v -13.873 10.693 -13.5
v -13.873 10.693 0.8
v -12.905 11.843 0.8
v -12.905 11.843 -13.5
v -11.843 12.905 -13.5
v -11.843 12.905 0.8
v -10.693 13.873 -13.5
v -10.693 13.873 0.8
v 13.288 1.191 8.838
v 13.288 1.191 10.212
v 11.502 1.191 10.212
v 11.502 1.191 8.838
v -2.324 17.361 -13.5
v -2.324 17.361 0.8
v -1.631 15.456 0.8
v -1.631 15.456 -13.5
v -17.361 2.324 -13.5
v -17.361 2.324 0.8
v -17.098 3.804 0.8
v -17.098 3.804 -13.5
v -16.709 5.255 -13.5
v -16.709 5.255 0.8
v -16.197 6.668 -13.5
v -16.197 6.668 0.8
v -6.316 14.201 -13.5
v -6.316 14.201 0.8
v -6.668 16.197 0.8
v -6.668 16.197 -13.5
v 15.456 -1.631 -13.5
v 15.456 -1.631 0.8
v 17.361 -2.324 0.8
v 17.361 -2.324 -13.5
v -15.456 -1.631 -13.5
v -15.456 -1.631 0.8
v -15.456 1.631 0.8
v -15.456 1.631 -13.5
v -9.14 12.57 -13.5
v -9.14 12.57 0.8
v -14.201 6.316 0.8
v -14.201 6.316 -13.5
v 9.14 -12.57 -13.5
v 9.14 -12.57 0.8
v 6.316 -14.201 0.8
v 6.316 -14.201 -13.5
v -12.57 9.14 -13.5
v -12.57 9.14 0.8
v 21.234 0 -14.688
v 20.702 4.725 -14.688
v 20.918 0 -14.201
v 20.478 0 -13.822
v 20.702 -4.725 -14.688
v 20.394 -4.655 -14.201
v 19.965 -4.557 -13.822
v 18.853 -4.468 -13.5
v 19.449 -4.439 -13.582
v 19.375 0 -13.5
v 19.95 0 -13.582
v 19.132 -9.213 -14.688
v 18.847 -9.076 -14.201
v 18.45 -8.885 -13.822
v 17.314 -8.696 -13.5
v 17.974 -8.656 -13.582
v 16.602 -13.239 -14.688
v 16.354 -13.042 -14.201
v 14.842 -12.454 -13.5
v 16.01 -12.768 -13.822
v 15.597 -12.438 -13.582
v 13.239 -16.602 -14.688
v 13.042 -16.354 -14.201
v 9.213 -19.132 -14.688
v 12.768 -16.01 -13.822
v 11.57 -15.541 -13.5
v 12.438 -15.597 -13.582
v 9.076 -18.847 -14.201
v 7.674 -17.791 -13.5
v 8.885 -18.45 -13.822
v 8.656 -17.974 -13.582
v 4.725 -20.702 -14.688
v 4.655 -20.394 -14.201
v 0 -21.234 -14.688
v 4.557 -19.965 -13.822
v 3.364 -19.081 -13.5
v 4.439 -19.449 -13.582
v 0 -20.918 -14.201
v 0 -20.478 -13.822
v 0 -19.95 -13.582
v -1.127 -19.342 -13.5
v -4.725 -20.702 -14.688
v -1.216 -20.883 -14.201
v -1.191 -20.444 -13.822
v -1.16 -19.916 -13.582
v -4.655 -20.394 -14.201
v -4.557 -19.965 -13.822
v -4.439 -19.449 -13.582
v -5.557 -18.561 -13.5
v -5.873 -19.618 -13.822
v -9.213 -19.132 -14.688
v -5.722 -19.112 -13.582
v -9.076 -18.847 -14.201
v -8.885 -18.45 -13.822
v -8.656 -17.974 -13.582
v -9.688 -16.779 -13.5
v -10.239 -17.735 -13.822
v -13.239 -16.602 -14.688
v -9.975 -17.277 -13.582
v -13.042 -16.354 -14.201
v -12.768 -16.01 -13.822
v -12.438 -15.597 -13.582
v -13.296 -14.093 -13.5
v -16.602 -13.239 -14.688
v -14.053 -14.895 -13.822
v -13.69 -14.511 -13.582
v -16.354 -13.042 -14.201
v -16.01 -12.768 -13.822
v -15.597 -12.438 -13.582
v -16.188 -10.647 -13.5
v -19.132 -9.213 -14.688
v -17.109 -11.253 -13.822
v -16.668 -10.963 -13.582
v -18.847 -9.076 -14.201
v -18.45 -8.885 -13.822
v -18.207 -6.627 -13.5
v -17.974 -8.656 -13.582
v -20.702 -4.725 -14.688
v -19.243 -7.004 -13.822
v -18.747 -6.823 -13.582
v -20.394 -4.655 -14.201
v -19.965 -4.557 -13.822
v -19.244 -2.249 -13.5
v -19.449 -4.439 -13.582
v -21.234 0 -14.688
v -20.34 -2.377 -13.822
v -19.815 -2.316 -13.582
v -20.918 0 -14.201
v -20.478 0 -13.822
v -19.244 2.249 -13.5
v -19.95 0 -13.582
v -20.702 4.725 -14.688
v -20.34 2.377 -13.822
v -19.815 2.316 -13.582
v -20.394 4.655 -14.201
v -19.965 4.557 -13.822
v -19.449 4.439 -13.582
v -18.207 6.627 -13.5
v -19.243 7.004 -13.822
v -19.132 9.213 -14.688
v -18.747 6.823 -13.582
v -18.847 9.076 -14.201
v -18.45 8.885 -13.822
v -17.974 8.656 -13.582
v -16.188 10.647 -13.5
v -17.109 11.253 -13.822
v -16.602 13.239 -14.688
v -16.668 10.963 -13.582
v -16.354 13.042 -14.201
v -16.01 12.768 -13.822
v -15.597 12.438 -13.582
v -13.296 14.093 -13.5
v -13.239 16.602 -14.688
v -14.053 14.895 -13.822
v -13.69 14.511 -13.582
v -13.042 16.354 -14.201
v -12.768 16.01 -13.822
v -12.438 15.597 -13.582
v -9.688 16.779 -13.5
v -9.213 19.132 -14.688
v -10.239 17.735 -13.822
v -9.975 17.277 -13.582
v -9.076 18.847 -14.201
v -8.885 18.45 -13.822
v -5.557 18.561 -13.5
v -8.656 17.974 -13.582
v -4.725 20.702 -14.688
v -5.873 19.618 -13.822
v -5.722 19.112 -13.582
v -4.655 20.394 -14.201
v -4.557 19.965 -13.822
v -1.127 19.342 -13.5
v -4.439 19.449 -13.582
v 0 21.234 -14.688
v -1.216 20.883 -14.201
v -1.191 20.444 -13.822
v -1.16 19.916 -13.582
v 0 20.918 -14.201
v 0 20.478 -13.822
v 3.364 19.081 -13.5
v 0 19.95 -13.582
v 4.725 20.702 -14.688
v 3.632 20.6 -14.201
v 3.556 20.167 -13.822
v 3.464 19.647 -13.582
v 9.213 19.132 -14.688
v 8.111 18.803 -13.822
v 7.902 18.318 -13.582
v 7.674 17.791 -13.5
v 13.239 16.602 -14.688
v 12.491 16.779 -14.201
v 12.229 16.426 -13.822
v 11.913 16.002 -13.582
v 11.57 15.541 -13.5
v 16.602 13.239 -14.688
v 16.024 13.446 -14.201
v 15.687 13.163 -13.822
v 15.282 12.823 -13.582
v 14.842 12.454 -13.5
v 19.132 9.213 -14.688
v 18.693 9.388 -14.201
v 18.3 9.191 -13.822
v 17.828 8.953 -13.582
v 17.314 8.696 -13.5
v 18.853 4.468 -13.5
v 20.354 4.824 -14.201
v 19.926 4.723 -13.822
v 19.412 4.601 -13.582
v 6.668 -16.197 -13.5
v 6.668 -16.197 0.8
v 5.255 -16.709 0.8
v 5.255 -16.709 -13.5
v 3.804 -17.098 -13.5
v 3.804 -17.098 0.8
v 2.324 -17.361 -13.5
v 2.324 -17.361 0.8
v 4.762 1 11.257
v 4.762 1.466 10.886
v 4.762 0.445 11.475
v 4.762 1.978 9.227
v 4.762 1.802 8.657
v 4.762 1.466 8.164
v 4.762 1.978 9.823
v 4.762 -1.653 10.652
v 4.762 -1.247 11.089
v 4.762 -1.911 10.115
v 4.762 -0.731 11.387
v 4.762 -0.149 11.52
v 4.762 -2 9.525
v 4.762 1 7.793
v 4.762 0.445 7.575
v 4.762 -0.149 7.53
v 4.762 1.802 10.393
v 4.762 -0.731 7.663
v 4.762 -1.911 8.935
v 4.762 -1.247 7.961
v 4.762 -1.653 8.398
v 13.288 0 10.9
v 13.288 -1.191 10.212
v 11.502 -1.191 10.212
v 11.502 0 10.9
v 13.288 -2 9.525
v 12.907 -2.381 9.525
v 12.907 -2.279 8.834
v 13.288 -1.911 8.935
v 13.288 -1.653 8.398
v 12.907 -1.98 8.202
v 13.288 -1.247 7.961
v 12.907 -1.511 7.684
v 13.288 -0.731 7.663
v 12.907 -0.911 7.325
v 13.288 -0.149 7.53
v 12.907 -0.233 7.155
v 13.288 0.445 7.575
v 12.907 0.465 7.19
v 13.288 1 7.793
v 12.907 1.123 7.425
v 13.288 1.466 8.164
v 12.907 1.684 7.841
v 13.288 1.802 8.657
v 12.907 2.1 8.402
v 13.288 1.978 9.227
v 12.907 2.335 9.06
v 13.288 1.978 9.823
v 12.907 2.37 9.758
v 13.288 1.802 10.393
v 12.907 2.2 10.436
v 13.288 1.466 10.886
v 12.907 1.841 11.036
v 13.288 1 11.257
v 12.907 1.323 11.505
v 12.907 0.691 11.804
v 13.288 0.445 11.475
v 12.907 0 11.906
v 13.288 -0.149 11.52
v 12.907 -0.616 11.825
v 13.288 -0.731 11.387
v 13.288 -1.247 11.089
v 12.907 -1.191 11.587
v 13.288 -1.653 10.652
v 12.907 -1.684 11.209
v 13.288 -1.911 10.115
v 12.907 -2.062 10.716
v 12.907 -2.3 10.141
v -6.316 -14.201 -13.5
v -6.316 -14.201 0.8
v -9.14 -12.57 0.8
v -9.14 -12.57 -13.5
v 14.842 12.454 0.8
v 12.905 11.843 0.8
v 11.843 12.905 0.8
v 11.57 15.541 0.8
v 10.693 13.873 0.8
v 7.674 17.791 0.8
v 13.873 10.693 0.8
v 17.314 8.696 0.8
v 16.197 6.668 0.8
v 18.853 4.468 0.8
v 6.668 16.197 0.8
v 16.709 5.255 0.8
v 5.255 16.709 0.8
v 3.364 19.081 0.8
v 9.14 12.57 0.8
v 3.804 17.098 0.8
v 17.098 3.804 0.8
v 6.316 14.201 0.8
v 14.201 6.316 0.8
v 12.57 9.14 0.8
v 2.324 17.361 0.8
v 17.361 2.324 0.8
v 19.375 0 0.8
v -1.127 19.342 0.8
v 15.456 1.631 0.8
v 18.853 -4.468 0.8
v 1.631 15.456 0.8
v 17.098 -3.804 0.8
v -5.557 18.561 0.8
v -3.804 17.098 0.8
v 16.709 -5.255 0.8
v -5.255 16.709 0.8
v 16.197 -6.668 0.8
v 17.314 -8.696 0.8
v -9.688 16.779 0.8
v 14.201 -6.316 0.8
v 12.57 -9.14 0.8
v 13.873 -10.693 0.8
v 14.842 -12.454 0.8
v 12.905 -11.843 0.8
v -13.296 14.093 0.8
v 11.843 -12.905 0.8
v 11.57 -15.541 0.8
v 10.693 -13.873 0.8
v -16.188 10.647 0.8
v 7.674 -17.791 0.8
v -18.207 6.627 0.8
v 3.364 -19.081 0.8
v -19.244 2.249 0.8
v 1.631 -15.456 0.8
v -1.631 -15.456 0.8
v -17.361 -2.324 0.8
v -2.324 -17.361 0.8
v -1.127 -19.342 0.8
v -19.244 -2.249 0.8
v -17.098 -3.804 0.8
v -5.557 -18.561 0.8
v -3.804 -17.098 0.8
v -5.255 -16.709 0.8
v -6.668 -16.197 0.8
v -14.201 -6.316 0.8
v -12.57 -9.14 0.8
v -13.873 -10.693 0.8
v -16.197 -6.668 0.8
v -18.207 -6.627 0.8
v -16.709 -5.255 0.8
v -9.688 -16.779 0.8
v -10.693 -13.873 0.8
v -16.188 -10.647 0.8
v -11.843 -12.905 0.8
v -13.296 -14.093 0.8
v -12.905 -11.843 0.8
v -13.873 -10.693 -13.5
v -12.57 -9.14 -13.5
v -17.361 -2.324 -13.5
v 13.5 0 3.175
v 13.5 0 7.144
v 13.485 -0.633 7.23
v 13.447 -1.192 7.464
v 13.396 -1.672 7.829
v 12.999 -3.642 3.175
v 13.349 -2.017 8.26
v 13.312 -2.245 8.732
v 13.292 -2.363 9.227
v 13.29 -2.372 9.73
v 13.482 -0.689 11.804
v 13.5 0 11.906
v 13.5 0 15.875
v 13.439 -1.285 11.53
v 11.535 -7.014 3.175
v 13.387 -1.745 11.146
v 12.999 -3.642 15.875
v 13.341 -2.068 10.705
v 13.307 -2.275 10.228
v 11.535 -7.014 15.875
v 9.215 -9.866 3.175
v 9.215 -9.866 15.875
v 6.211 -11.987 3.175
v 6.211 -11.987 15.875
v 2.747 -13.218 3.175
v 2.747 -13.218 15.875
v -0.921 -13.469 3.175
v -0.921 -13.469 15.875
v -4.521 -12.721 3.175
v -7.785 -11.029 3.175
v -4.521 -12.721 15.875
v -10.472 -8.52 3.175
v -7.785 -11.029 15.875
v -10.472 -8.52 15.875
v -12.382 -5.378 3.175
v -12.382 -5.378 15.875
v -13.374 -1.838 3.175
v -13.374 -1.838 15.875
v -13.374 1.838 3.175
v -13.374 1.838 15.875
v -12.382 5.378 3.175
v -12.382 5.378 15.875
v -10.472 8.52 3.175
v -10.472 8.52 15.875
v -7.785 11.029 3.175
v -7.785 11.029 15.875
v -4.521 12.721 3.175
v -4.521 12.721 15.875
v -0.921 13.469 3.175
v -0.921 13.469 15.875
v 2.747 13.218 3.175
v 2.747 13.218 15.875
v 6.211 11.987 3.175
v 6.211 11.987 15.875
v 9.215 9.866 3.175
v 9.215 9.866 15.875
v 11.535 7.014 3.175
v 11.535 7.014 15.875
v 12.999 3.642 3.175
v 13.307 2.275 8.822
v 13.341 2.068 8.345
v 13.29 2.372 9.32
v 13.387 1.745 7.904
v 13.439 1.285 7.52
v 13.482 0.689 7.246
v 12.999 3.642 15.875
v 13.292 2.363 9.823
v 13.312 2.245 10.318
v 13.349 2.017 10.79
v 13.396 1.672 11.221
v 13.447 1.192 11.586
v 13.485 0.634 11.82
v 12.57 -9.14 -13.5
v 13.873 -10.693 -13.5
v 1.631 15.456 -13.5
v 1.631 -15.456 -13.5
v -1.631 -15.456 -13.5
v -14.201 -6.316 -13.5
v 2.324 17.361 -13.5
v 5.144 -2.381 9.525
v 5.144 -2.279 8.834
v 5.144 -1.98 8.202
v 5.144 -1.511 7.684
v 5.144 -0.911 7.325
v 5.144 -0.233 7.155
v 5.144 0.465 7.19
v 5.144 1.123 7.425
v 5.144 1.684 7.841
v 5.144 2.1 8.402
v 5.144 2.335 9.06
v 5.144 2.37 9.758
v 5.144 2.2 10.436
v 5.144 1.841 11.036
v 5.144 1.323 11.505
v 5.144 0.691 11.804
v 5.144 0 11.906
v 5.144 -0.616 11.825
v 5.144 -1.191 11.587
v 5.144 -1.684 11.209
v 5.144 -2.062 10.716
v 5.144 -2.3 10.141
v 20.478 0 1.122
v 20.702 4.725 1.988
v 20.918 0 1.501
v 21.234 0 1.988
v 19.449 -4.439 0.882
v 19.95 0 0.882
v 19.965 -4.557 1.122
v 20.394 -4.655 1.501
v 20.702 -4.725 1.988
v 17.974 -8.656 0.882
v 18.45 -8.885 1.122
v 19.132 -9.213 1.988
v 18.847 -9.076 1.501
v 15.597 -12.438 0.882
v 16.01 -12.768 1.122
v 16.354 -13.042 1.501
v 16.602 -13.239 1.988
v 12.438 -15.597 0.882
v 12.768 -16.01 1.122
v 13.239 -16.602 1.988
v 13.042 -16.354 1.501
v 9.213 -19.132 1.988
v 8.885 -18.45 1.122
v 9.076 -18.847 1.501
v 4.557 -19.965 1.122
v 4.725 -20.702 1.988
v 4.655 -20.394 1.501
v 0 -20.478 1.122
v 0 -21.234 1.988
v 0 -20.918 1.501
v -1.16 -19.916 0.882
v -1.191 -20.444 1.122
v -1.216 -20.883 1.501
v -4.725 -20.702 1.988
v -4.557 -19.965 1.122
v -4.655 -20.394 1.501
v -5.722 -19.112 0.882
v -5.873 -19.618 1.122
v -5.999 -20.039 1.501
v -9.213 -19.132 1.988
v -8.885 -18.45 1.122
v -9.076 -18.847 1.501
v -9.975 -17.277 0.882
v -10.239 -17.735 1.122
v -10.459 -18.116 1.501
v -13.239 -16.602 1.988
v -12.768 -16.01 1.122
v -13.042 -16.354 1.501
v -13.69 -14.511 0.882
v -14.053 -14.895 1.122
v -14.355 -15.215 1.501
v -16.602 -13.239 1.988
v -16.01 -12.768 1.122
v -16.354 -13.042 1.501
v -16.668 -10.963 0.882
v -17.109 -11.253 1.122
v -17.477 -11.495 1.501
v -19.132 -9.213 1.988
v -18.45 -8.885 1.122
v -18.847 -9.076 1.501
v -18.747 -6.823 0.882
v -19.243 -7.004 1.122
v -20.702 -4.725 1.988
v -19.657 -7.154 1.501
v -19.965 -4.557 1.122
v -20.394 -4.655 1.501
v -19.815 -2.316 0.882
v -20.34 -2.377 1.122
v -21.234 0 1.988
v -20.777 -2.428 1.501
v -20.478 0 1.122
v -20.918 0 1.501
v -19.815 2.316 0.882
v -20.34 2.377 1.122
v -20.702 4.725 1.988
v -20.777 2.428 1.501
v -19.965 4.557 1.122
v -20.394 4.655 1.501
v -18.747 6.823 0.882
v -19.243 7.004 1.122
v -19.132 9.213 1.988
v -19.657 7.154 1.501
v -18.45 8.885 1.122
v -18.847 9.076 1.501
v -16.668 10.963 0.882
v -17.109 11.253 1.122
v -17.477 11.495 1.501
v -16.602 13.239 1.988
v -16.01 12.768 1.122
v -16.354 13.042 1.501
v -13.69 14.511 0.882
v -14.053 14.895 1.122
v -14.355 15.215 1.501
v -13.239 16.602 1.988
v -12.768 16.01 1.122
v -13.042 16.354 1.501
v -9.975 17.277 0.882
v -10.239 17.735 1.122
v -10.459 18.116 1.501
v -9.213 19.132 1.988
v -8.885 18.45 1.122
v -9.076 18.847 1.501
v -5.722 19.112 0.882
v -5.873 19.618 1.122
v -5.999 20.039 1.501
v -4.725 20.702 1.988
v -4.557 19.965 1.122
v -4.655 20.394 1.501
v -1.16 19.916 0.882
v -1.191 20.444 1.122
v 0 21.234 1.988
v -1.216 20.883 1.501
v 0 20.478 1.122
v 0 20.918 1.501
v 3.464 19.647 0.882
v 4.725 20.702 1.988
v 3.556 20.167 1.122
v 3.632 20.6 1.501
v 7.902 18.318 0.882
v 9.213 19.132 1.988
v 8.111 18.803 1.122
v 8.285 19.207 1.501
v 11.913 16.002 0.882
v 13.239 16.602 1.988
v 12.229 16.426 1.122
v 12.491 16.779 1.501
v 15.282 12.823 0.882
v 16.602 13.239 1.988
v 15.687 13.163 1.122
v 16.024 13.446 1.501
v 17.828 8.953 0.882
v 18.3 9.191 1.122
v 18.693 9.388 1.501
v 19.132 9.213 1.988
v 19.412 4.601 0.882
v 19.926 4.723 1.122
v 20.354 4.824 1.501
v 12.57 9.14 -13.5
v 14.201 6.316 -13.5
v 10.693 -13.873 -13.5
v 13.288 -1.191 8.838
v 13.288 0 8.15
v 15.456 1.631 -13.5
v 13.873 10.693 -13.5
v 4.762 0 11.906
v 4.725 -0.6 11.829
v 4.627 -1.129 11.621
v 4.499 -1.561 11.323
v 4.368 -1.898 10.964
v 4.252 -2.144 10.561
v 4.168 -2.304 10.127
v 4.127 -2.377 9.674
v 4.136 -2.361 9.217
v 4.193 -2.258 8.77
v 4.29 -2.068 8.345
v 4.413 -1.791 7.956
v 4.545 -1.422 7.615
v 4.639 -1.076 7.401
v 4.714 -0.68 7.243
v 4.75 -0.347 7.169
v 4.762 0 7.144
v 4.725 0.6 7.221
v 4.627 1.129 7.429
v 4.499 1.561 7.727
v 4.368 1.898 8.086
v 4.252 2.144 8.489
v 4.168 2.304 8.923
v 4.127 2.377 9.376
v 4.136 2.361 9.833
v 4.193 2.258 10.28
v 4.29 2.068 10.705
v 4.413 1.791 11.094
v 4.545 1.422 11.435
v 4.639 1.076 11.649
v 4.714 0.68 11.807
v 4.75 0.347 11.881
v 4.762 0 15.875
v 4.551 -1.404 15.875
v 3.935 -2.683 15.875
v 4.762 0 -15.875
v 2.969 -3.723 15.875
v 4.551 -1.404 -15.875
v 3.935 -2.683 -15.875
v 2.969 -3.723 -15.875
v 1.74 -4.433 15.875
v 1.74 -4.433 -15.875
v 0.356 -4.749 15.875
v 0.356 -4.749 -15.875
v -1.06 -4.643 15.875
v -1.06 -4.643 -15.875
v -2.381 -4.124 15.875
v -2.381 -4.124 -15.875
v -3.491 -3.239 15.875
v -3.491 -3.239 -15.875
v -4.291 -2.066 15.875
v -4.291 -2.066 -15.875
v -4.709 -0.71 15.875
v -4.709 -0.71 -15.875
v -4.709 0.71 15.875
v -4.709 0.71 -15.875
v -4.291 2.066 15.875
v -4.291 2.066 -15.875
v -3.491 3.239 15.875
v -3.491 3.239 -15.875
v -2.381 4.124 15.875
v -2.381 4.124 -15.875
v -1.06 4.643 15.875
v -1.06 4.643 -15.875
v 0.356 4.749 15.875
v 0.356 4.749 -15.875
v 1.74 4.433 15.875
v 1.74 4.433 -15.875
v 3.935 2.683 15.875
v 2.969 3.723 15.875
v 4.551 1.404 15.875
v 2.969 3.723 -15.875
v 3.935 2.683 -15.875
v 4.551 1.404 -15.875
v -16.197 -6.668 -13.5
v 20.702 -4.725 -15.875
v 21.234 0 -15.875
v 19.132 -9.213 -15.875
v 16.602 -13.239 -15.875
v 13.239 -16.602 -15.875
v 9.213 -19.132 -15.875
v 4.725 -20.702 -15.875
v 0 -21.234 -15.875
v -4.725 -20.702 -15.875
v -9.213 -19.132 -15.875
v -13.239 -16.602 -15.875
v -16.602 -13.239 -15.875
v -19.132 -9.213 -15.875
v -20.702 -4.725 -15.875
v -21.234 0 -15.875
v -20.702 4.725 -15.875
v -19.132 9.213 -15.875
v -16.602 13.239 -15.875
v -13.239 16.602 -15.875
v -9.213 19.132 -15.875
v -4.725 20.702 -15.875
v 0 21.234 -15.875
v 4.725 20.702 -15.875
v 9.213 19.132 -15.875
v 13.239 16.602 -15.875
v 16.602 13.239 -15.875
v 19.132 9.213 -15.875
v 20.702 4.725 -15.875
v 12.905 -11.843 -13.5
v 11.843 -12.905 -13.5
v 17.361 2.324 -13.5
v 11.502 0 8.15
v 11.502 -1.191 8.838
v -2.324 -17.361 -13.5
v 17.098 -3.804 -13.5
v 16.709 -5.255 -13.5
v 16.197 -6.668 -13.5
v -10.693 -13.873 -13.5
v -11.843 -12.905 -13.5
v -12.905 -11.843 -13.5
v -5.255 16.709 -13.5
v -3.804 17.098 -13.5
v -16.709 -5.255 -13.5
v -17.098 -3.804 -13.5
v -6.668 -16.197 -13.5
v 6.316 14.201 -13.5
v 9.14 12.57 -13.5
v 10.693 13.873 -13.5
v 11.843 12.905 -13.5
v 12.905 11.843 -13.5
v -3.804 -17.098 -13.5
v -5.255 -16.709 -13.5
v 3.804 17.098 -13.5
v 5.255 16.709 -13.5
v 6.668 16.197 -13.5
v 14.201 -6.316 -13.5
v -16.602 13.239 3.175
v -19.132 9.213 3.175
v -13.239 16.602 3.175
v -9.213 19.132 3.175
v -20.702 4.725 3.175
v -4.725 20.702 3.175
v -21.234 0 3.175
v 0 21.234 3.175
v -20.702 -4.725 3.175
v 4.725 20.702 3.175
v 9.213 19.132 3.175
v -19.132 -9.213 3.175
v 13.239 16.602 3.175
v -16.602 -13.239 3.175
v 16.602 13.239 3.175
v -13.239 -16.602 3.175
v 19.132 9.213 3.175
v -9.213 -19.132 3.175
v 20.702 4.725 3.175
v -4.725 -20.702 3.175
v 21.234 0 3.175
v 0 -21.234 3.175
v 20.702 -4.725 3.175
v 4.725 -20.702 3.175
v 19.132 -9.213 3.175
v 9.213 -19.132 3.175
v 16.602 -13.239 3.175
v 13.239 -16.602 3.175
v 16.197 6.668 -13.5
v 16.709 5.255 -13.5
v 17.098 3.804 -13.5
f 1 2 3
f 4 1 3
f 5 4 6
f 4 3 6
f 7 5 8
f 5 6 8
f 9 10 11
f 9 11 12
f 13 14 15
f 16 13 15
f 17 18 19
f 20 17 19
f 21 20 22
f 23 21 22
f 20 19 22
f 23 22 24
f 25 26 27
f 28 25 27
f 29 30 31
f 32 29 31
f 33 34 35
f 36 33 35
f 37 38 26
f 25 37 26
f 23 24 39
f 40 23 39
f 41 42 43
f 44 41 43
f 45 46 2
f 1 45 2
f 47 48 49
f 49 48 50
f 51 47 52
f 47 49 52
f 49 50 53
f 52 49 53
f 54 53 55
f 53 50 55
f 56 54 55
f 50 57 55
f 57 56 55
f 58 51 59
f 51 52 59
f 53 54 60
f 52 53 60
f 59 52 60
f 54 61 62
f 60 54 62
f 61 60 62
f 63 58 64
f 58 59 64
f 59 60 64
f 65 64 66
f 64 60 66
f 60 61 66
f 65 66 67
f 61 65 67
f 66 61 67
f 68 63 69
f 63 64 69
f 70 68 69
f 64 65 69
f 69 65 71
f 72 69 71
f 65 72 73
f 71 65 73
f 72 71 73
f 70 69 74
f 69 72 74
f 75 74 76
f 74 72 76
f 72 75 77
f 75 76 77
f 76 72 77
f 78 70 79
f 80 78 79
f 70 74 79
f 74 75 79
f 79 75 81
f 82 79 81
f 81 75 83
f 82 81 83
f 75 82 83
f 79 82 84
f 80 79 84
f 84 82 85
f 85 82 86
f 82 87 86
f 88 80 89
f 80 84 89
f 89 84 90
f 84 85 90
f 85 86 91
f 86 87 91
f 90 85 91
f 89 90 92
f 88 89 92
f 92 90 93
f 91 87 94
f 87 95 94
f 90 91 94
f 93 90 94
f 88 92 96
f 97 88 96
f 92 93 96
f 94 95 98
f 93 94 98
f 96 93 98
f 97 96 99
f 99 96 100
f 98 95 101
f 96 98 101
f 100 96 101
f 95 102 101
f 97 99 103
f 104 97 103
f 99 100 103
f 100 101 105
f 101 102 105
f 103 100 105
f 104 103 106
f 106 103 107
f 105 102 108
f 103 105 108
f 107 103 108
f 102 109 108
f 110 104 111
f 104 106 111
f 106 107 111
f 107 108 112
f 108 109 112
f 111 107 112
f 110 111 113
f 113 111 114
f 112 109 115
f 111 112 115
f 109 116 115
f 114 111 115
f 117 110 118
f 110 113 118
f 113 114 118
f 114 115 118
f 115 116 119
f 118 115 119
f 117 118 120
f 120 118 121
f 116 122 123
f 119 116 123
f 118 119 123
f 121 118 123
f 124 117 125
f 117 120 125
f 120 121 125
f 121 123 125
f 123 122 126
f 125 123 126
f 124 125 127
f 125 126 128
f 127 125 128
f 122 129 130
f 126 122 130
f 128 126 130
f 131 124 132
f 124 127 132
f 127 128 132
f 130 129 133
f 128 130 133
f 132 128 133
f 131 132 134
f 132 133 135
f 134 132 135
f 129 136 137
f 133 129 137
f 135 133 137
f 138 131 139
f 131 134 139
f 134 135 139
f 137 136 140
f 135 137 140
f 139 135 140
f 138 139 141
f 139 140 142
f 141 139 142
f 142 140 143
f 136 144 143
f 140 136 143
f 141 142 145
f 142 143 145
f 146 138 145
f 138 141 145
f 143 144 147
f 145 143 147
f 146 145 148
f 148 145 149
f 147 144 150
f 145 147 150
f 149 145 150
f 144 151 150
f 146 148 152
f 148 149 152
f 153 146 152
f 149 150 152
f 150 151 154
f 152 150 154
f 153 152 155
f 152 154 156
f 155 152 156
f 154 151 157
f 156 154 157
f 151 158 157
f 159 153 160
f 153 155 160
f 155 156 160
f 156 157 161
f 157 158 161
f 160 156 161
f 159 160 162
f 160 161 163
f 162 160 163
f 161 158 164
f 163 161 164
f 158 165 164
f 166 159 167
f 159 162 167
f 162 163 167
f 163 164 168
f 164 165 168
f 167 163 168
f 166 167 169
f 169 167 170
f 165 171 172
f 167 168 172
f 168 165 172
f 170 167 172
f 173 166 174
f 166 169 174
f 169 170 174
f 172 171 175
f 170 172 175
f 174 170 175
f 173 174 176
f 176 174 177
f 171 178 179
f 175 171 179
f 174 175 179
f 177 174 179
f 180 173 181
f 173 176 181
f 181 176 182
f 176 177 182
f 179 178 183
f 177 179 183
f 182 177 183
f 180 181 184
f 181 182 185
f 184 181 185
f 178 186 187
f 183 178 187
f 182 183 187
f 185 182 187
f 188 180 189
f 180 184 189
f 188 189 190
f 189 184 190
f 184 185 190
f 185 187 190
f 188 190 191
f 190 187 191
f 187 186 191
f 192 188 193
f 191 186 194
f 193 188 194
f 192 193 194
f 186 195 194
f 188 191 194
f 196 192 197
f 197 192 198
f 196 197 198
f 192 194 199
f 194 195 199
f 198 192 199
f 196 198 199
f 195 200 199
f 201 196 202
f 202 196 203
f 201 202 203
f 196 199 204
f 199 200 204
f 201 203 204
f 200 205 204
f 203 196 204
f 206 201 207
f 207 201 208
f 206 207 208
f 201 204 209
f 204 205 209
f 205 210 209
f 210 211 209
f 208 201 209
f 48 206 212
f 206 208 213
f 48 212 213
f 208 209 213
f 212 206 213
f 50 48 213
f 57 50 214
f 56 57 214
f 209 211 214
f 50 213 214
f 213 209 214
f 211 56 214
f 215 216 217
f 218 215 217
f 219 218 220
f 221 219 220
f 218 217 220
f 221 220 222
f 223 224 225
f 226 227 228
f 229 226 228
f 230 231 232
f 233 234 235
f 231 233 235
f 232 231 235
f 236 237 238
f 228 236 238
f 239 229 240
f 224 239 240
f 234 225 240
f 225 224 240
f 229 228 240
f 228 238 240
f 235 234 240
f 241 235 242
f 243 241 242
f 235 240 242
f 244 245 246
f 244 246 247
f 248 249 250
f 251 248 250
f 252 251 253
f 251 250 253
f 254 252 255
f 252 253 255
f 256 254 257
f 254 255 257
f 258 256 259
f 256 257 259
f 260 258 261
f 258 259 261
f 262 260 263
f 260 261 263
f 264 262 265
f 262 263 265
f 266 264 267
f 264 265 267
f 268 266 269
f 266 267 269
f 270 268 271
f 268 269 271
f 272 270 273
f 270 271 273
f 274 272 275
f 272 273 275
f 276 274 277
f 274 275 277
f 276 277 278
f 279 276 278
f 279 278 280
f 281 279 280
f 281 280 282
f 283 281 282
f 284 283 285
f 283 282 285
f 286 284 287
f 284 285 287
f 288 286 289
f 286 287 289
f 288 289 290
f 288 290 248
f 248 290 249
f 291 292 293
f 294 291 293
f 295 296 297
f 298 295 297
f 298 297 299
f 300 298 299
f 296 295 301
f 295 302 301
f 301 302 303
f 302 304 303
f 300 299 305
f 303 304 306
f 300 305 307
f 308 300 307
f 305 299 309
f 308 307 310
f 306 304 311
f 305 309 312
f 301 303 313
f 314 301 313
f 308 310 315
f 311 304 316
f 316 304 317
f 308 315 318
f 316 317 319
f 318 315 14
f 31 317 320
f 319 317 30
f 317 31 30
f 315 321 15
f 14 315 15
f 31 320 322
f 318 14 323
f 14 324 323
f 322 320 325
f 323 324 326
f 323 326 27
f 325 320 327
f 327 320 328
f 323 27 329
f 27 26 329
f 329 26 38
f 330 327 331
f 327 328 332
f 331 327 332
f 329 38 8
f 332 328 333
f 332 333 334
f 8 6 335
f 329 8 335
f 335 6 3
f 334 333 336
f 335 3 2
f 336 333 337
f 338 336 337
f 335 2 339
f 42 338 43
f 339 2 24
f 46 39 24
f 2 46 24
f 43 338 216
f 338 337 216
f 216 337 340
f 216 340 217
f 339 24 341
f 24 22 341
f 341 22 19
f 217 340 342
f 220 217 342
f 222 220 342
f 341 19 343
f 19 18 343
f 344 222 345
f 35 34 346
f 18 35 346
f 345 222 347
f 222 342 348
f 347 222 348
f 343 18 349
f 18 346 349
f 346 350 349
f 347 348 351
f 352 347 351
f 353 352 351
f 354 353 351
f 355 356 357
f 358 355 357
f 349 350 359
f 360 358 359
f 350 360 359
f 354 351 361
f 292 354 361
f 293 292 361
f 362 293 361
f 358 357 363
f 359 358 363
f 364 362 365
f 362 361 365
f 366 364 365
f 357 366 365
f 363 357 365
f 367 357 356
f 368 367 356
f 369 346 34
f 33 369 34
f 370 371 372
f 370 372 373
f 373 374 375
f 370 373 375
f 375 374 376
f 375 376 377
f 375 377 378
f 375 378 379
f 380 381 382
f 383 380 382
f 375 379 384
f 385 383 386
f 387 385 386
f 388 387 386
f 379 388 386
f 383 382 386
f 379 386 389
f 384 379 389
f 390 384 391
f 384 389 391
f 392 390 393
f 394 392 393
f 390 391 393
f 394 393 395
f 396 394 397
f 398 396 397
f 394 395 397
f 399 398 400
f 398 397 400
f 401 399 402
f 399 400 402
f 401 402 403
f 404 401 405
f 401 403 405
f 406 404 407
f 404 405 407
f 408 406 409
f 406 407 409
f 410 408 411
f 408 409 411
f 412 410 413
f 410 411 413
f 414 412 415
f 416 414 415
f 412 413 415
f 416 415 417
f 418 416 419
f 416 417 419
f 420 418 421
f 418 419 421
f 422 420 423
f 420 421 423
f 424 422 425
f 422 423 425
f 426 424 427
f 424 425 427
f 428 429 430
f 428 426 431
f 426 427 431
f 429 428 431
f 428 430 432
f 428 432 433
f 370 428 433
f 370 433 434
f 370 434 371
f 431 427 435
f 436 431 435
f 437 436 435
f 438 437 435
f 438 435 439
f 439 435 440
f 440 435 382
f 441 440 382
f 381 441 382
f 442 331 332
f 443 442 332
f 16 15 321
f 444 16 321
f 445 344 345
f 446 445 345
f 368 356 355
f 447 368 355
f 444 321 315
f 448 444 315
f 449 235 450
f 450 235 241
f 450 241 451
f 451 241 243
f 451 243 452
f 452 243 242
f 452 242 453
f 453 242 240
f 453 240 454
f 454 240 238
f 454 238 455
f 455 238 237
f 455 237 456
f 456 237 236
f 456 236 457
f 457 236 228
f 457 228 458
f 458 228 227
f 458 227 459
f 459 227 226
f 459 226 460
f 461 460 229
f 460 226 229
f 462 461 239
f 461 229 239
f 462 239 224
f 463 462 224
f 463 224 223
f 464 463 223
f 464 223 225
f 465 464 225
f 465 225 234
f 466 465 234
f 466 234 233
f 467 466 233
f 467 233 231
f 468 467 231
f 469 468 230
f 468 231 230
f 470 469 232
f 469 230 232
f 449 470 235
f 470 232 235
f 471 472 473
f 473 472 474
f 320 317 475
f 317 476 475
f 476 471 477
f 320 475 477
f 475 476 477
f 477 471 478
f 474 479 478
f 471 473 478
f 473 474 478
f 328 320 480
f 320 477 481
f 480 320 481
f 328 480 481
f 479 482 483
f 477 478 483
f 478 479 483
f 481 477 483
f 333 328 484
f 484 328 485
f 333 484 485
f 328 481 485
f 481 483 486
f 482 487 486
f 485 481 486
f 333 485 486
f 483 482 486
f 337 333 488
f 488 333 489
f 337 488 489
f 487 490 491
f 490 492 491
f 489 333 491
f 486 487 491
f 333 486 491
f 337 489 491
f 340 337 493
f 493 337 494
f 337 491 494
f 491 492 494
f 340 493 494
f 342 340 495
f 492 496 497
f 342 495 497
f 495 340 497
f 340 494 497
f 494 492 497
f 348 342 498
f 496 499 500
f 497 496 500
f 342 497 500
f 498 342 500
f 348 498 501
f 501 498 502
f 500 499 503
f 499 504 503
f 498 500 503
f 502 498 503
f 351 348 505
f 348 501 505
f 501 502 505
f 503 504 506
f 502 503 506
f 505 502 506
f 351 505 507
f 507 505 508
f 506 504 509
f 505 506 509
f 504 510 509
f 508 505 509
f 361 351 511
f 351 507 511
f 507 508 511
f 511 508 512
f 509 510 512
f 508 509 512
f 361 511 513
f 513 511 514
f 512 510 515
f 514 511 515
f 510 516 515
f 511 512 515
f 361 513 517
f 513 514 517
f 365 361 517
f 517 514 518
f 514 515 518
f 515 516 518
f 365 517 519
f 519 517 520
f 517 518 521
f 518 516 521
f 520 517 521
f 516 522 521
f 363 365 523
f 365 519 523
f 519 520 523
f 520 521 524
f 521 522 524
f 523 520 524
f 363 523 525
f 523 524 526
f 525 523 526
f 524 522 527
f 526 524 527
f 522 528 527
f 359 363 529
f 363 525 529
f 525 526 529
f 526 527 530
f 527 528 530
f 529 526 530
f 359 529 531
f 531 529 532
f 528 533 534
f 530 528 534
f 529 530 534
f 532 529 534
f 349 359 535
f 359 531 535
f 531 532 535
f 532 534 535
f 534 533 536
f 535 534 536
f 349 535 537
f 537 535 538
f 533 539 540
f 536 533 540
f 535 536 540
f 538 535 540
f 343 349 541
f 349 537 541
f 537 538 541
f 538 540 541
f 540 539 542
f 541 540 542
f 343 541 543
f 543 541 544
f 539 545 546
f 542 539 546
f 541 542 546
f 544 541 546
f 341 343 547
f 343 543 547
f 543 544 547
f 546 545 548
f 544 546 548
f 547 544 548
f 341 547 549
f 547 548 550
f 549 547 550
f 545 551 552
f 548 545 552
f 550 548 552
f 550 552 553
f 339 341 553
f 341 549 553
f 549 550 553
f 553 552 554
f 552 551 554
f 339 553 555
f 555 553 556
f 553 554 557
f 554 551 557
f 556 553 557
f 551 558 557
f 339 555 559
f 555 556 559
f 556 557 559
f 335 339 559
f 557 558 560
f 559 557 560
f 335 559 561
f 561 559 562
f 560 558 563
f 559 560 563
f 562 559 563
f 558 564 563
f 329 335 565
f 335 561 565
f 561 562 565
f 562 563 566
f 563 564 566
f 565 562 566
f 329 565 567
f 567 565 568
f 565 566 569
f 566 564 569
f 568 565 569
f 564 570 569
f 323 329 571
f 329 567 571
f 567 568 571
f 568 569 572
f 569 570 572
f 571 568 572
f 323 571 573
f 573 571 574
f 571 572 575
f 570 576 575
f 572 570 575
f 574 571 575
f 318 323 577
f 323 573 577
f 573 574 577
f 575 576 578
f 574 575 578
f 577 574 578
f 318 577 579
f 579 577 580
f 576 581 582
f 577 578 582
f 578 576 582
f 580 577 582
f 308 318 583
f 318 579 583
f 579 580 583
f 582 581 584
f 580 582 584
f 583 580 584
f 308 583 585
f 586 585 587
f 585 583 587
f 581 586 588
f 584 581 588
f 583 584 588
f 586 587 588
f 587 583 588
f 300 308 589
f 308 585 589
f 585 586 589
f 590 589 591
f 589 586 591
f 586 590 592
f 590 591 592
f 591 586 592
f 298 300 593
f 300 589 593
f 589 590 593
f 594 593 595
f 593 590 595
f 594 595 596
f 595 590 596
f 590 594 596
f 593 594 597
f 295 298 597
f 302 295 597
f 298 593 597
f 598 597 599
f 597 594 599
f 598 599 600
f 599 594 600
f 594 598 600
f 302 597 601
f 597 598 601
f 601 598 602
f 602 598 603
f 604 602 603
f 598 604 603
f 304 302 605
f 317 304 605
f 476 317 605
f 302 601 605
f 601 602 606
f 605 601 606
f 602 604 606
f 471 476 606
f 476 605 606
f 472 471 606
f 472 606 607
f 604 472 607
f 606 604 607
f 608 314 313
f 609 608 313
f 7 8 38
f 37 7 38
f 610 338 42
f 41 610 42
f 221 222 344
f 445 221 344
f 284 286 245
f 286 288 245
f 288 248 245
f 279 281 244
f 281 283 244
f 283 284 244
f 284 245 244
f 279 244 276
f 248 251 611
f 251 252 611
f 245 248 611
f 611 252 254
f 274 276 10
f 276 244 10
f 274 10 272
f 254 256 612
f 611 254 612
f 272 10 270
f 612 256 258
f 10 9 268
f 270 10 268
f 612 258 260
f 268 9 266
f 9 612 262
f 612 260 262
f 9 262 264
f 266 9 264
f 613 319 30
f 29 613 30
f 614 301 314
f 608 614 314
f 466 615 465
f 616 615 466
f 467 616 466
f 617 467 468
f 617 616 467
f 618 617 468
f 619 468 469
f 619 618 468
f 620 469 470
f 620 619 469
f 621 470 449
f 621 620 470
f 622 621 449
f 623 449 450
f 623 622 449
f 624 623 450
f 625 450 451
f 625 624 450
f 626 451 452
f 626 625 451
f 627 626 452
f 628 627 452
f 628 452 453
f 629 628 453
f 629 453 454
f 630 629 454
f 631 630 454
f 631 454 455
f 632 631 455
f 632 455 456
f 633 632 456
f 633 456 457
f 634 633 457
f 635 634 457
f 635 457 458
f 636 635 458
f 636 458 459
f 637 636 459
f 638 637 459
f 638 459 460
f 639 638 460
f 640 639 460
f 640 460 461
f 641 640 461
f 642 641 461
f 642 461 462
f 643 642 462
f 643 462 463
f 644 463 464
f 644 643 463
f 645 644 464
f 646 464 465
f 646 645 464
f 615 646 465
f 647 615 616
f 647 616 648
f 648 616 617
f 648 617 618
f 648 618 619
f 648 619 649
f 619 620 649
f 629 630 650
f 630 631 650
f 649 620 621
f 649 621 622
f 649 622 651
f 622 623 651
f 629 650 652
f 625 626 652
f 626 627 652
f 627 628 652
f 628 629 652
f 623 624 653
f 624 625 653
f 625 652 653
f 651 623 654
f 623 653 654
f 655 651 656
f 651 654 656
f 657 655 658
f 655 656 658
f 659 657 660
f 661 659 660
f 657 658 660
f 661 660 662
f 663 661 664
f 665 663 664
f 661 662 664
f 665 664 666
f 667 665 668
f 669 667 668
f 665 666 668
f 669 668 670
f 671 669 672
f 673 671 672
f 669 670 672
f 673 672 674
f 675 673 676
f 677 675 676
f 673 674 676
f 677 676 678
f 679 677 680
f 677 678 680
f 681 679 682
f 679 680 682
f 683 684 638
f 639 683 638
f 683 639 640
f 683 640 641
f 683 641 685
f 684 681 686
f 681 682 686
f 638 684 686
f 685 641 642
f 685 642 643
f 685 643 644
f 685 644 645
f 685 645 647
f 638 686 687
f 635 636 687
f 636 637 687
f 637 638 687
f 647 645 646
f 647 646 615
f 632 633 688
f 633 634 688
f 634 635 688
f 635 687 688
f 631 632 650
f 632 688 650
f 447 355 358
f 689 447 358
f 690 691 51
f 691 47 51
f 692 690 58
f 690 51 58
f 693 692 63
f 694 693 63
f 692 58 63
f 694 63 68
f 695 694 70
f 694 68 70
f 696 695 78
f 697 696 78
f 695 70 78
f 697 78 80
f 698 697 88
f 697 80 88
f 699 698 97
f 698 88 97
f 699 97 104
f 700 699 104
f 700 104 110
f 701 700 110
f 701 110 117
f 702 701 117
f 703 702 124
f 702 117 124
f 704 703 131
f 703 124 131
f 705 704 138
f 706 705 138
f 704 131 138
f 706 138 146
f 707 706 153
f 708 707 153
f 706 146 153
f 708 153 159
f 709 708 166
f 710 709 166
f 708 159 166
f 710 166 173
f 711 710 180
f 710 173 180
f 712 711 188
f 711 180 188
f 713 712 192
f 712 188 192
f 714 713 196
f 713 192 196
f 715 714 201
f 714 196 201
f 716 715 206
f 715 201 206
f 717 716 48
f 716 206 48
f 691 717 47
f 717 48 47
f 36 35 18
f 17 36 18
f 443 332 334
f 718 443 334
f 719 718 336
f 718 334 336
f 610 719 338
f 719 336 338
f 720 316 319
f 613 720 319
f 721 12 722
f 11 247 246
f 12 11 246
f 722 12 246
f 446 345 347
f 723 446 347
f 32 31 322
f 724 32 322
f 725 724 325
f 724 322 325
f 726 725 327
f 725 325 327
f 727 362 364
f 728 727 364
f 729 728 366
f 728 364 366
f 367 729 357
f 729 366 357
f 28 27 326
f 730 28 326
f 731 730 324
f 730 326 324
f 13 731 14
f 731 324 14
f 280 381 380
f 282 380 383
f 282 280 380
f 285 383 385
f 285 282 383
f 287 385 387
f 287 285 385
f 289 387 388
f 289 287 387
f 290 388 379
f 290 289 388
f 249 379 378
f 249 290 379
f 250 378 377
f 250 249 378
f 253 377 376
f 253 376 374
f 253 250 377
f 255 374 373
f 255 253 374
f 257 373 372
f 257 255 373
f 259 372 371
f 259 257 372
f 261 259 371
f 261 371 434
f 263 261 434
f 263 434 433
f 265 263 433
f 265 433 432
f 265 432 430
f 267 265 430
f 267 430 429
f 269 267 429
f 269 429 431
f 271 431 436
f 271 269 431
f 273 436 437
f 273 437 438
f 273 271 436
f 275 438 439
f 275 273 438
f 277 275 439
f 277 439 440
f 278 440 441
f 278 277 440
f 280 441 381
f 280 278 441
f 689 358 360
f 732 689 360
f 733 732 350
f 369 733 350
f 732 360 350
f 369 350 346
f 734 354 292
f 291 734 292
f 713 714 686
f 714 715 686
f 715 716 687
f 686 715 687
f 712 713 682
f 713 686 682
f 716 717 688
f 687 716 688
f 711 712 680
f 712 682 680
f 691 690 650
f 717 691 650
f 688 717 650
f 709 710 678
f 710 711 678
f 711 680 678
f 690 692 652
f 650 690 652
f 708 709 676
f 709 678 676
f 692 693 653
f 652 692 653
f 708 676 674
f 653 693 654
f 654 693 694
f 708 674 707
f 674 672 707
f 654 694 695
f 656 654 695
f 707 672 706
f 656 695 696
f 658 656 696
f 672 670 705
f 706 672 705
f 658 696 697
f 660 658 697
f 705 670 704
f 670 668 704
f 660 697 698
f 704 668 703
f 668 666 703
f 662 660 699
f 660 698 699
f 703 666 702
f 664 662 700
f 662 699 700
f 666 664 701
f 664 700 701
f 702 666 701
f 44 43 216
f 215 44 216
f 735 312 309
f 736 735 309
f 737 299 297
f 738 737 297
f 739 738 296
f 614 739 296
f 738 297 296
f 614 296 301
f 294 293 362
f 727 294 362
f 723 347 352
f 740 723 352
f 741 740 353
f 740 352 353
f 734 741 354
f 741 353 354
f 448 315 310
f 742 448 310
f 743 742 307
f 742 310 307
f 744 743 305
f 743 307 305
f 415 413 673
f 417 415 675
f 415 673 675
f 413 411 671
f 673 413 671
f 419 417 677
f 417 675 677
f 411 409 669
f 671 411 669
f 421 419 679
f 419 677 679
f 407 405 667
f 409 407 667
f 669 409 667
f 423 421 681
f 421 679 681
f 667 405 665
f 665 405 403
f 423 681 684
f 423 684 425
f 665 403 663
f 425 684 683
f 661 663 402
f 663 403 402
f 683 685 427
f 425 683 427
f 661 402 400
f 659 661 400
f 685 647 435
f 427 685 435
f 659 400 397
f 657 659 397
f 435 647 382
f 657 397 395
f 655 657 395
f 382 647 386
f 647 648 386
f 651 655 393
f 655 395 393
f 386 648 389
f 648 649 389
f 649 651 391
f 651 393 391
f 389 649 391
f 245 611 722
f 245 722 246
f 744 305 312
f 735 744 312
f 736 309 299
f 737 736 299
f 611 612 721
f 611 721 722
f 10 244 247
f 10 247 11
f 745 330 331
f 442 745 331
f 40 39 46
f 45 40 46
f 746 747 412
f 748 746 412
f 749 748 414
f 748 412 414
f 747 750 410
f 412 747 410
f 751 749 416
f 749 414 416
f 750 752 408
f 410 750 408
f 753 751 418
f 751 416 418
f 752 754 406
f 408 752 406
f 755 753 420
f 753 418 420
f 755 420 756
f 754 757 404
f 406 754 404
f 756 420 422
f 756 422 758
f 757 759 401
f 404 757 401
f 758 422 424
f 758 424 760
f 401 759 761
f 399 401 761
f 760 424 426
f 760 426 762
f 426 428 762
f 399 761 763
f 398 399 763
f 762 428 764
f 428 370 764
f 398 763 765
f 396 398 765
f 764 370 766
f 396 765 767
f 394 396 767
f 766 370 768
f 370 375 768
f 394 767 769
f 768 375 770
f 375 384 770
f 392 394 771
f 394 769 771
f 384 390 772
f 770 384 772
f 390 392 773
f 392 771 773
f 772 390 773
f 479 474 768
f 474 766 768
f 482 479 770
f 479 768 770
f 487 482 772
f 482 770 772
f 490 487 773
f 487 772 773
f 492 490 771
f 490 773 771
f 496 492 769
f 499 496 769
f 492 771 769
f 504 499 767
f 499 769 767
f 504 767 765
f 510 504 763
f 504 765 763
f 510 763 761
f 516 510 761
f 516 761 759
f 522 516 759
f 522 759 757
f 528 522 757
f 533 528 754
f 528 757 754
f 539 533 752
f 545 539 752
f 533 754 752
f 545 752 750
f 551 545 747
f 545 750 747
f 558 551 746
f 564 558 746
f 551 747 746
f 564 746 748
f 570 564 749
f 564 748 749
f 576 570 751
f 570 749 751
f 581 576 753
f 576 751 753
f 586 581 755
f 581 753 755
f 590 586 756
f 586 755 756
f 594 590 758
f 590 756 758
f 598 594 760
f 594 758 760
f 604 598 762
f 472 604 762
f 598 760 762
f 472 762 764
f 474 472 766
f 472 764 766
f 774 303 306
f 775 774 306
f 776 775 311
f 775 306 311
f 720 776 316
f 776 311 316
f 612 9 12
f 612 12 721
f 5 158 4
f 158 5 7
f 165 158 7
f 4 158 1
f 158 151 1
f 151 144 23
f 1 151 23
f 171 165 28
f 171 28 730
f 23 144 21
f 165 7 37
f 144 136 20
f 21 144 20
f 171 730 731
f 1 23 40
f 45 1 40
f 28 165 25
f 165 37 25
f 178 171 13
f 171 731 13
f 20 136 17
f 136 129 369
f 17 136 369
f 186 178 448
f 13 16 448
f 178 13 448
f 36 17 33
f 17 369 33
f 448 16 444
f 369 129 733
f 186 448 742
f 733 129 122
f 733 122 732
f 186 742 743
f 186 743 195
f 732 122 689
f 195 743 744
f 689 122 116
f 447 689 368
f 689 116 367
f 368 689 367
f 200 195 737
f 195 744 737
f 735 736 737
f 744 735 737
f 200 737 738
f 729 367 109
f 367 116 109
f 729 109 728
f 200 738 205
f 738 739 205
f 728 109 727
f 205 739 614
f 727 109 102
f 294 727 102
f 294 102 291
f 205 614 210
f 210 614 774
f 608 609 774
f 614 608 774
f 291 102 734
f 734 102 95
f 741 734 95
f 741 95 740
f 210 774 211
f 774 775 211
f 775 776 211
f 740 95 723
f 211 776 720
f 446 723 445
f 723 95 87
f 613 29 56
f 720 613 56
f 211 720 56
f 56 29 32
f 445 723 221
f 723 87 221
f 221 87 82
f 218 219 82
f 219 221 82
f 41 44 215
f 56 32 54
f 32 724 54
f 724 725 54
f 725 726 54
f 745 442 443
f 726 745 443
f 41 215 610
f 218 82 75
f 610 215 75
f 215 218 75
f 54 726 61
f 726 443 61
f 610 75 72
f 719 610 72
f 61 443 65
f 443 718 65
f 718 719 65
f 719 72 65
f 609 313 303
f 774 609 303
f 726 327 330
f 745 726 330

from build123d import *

# Parameters (mm, degrees)
CUT_EXTRUDE1_START = 0.8001
CUT_EXTRUDE1_DEPTH = 14.3002
CIRPATTERN1_COUNT  = 12
SKETCH4_R          = 2.38125
CUT_EXTRUDE2_DEPTH = 34.967854094
CUT_EXTRUDE3_DEPTH = 1.7859375


with BuildPart() as part:
    # Sketch2 → Revolve1 (revolve)
    with BuildSketch(Plane(origin=(0, 0, 0), x_dir=(0, 0, -1), z_dir=(1, 0, 0)), mode=Mode.PRIVATE) as revolve1_sk:
        with BuildLine():
            Line((-15.875, 4.7625), (15.875, 4.7625))
            Line((15.875, 4.7625), (15.875, 21.2344))
            Line((15.875, 21.2344), (14.68755, 21.2344))
            ThreePointArc((14.68755, 21.2344), (13.822288491, 20.478159839), (13.5001, 19.375086298))
            Line((13.5001, 19.375086298), (13.5001, 17.515772596))
            Line((13.5001, 17.515772596), (-0.8001, 17.515772596))
            Line((-0.8001, 17.515772596), (-0.8001, 19.375086298))
            ThreePointArc((-0.8001, 19.375086298), (-1.122288491, 20.478159839), (-1.98755, 21.2344))
            Line((-1.98755, 21.2344), (-3.175, 21.2344))
            Line((-3.175, 21.2344), (-3.175, 13.5001))
            Line((-3.175, 13.5001), (-15.875, 13.5001))
            Line((-15.875, 13.5001), (-15.875, 4.7625))
        make_face()
    revolve(revolve1_sk.sketch.rotate(Axis((0, 0, 15.875), (0, 0, -1)), 90), axis=Axis((0, 0, 15.875), (0, 0, -1)))

    # Sketch3 → Cut-Extrude1 (cut)
    with BuildSketch(Plane.XY.offset(CUT_EXTRUDE1_START)):
        with BuildLine():
            Line((-1.630736704, 15.4559), (1.630736704, 15.4559))
            Line((1.630736704, 15.4559), (2.3241, 17.3609))
            ThreePointArc((2.3241, 17.3609), (0, 17.515772596), (-2.3241, 17.3609))
            Line((-2.3241, 17.3609), (-1.630736704, 15.4559))
        make_face()
    cut_extrude1 = extrude(amount=-CUT_EXTRUDE1_DEPTH, mode=Mode.SUBTRACT)

    # CirPattern1: Cut-Extrude1 ×12 about axis
    cirpattern1_axis = Axis((0, 0, 0), (0, 0, 1))
    for i in range(1, CIRPATTERN1_COUNT):
        add(cut_extrude1.rotate(cirpattern1_axis, i * 360 / CIRPATTERN1_COUNT), mode=Mode.SUBTRACT)

    # Sketch4 → Cut-Extrude2 (cut, through all)
    with BuildSketch(Plane(origin=(0, 0, 0), x_dir=(0, -1, 0), z_dir=(1, 0, 0))):
        with Locations(Location((0, -9.525, 0), (0, 0, 270))):
            Circle(SKETCH4_R)
    extrude(amount=CUT_EXTRUDE2_DEPTH, mode=Mode.SUBTRACT)

    # Sketch5 → Revolve2 (revolve)
    with BuildSketch(Plane.XY.offset(9.525)):
        Polygon((4.7625, -2.00025), (4.7625, 0), (13.288429119, 0), (13.288429119, -2.00025), (12.907429119, -2.38125), (5.1435, -2.38125), align=None)
    revolve(axis=Axis((4.7625, 0, 9.525), (1, 0, 0)))

    # Sketch6 → Cut-Extrude3 (cut)
    with BuildSketch(Plane(origin=(13.288429119, 5.384140679, 0), x_dir=(0, -1, 0), z_dir=(-1, 0, 0))):
        Polygon((5.384140679, 10.899815329), (4.193515679, 10.212407664), (4.193515679, 8.837592336), (5.384140679, 8.150184671), (6.574765679, 8.837592336), (6.574765679, 10.212407664), align=None)
    extrude(amount=CUT_EXTRUDE3_DEPTH, mode=Mode.SUBTRACT)


solid = part.part
